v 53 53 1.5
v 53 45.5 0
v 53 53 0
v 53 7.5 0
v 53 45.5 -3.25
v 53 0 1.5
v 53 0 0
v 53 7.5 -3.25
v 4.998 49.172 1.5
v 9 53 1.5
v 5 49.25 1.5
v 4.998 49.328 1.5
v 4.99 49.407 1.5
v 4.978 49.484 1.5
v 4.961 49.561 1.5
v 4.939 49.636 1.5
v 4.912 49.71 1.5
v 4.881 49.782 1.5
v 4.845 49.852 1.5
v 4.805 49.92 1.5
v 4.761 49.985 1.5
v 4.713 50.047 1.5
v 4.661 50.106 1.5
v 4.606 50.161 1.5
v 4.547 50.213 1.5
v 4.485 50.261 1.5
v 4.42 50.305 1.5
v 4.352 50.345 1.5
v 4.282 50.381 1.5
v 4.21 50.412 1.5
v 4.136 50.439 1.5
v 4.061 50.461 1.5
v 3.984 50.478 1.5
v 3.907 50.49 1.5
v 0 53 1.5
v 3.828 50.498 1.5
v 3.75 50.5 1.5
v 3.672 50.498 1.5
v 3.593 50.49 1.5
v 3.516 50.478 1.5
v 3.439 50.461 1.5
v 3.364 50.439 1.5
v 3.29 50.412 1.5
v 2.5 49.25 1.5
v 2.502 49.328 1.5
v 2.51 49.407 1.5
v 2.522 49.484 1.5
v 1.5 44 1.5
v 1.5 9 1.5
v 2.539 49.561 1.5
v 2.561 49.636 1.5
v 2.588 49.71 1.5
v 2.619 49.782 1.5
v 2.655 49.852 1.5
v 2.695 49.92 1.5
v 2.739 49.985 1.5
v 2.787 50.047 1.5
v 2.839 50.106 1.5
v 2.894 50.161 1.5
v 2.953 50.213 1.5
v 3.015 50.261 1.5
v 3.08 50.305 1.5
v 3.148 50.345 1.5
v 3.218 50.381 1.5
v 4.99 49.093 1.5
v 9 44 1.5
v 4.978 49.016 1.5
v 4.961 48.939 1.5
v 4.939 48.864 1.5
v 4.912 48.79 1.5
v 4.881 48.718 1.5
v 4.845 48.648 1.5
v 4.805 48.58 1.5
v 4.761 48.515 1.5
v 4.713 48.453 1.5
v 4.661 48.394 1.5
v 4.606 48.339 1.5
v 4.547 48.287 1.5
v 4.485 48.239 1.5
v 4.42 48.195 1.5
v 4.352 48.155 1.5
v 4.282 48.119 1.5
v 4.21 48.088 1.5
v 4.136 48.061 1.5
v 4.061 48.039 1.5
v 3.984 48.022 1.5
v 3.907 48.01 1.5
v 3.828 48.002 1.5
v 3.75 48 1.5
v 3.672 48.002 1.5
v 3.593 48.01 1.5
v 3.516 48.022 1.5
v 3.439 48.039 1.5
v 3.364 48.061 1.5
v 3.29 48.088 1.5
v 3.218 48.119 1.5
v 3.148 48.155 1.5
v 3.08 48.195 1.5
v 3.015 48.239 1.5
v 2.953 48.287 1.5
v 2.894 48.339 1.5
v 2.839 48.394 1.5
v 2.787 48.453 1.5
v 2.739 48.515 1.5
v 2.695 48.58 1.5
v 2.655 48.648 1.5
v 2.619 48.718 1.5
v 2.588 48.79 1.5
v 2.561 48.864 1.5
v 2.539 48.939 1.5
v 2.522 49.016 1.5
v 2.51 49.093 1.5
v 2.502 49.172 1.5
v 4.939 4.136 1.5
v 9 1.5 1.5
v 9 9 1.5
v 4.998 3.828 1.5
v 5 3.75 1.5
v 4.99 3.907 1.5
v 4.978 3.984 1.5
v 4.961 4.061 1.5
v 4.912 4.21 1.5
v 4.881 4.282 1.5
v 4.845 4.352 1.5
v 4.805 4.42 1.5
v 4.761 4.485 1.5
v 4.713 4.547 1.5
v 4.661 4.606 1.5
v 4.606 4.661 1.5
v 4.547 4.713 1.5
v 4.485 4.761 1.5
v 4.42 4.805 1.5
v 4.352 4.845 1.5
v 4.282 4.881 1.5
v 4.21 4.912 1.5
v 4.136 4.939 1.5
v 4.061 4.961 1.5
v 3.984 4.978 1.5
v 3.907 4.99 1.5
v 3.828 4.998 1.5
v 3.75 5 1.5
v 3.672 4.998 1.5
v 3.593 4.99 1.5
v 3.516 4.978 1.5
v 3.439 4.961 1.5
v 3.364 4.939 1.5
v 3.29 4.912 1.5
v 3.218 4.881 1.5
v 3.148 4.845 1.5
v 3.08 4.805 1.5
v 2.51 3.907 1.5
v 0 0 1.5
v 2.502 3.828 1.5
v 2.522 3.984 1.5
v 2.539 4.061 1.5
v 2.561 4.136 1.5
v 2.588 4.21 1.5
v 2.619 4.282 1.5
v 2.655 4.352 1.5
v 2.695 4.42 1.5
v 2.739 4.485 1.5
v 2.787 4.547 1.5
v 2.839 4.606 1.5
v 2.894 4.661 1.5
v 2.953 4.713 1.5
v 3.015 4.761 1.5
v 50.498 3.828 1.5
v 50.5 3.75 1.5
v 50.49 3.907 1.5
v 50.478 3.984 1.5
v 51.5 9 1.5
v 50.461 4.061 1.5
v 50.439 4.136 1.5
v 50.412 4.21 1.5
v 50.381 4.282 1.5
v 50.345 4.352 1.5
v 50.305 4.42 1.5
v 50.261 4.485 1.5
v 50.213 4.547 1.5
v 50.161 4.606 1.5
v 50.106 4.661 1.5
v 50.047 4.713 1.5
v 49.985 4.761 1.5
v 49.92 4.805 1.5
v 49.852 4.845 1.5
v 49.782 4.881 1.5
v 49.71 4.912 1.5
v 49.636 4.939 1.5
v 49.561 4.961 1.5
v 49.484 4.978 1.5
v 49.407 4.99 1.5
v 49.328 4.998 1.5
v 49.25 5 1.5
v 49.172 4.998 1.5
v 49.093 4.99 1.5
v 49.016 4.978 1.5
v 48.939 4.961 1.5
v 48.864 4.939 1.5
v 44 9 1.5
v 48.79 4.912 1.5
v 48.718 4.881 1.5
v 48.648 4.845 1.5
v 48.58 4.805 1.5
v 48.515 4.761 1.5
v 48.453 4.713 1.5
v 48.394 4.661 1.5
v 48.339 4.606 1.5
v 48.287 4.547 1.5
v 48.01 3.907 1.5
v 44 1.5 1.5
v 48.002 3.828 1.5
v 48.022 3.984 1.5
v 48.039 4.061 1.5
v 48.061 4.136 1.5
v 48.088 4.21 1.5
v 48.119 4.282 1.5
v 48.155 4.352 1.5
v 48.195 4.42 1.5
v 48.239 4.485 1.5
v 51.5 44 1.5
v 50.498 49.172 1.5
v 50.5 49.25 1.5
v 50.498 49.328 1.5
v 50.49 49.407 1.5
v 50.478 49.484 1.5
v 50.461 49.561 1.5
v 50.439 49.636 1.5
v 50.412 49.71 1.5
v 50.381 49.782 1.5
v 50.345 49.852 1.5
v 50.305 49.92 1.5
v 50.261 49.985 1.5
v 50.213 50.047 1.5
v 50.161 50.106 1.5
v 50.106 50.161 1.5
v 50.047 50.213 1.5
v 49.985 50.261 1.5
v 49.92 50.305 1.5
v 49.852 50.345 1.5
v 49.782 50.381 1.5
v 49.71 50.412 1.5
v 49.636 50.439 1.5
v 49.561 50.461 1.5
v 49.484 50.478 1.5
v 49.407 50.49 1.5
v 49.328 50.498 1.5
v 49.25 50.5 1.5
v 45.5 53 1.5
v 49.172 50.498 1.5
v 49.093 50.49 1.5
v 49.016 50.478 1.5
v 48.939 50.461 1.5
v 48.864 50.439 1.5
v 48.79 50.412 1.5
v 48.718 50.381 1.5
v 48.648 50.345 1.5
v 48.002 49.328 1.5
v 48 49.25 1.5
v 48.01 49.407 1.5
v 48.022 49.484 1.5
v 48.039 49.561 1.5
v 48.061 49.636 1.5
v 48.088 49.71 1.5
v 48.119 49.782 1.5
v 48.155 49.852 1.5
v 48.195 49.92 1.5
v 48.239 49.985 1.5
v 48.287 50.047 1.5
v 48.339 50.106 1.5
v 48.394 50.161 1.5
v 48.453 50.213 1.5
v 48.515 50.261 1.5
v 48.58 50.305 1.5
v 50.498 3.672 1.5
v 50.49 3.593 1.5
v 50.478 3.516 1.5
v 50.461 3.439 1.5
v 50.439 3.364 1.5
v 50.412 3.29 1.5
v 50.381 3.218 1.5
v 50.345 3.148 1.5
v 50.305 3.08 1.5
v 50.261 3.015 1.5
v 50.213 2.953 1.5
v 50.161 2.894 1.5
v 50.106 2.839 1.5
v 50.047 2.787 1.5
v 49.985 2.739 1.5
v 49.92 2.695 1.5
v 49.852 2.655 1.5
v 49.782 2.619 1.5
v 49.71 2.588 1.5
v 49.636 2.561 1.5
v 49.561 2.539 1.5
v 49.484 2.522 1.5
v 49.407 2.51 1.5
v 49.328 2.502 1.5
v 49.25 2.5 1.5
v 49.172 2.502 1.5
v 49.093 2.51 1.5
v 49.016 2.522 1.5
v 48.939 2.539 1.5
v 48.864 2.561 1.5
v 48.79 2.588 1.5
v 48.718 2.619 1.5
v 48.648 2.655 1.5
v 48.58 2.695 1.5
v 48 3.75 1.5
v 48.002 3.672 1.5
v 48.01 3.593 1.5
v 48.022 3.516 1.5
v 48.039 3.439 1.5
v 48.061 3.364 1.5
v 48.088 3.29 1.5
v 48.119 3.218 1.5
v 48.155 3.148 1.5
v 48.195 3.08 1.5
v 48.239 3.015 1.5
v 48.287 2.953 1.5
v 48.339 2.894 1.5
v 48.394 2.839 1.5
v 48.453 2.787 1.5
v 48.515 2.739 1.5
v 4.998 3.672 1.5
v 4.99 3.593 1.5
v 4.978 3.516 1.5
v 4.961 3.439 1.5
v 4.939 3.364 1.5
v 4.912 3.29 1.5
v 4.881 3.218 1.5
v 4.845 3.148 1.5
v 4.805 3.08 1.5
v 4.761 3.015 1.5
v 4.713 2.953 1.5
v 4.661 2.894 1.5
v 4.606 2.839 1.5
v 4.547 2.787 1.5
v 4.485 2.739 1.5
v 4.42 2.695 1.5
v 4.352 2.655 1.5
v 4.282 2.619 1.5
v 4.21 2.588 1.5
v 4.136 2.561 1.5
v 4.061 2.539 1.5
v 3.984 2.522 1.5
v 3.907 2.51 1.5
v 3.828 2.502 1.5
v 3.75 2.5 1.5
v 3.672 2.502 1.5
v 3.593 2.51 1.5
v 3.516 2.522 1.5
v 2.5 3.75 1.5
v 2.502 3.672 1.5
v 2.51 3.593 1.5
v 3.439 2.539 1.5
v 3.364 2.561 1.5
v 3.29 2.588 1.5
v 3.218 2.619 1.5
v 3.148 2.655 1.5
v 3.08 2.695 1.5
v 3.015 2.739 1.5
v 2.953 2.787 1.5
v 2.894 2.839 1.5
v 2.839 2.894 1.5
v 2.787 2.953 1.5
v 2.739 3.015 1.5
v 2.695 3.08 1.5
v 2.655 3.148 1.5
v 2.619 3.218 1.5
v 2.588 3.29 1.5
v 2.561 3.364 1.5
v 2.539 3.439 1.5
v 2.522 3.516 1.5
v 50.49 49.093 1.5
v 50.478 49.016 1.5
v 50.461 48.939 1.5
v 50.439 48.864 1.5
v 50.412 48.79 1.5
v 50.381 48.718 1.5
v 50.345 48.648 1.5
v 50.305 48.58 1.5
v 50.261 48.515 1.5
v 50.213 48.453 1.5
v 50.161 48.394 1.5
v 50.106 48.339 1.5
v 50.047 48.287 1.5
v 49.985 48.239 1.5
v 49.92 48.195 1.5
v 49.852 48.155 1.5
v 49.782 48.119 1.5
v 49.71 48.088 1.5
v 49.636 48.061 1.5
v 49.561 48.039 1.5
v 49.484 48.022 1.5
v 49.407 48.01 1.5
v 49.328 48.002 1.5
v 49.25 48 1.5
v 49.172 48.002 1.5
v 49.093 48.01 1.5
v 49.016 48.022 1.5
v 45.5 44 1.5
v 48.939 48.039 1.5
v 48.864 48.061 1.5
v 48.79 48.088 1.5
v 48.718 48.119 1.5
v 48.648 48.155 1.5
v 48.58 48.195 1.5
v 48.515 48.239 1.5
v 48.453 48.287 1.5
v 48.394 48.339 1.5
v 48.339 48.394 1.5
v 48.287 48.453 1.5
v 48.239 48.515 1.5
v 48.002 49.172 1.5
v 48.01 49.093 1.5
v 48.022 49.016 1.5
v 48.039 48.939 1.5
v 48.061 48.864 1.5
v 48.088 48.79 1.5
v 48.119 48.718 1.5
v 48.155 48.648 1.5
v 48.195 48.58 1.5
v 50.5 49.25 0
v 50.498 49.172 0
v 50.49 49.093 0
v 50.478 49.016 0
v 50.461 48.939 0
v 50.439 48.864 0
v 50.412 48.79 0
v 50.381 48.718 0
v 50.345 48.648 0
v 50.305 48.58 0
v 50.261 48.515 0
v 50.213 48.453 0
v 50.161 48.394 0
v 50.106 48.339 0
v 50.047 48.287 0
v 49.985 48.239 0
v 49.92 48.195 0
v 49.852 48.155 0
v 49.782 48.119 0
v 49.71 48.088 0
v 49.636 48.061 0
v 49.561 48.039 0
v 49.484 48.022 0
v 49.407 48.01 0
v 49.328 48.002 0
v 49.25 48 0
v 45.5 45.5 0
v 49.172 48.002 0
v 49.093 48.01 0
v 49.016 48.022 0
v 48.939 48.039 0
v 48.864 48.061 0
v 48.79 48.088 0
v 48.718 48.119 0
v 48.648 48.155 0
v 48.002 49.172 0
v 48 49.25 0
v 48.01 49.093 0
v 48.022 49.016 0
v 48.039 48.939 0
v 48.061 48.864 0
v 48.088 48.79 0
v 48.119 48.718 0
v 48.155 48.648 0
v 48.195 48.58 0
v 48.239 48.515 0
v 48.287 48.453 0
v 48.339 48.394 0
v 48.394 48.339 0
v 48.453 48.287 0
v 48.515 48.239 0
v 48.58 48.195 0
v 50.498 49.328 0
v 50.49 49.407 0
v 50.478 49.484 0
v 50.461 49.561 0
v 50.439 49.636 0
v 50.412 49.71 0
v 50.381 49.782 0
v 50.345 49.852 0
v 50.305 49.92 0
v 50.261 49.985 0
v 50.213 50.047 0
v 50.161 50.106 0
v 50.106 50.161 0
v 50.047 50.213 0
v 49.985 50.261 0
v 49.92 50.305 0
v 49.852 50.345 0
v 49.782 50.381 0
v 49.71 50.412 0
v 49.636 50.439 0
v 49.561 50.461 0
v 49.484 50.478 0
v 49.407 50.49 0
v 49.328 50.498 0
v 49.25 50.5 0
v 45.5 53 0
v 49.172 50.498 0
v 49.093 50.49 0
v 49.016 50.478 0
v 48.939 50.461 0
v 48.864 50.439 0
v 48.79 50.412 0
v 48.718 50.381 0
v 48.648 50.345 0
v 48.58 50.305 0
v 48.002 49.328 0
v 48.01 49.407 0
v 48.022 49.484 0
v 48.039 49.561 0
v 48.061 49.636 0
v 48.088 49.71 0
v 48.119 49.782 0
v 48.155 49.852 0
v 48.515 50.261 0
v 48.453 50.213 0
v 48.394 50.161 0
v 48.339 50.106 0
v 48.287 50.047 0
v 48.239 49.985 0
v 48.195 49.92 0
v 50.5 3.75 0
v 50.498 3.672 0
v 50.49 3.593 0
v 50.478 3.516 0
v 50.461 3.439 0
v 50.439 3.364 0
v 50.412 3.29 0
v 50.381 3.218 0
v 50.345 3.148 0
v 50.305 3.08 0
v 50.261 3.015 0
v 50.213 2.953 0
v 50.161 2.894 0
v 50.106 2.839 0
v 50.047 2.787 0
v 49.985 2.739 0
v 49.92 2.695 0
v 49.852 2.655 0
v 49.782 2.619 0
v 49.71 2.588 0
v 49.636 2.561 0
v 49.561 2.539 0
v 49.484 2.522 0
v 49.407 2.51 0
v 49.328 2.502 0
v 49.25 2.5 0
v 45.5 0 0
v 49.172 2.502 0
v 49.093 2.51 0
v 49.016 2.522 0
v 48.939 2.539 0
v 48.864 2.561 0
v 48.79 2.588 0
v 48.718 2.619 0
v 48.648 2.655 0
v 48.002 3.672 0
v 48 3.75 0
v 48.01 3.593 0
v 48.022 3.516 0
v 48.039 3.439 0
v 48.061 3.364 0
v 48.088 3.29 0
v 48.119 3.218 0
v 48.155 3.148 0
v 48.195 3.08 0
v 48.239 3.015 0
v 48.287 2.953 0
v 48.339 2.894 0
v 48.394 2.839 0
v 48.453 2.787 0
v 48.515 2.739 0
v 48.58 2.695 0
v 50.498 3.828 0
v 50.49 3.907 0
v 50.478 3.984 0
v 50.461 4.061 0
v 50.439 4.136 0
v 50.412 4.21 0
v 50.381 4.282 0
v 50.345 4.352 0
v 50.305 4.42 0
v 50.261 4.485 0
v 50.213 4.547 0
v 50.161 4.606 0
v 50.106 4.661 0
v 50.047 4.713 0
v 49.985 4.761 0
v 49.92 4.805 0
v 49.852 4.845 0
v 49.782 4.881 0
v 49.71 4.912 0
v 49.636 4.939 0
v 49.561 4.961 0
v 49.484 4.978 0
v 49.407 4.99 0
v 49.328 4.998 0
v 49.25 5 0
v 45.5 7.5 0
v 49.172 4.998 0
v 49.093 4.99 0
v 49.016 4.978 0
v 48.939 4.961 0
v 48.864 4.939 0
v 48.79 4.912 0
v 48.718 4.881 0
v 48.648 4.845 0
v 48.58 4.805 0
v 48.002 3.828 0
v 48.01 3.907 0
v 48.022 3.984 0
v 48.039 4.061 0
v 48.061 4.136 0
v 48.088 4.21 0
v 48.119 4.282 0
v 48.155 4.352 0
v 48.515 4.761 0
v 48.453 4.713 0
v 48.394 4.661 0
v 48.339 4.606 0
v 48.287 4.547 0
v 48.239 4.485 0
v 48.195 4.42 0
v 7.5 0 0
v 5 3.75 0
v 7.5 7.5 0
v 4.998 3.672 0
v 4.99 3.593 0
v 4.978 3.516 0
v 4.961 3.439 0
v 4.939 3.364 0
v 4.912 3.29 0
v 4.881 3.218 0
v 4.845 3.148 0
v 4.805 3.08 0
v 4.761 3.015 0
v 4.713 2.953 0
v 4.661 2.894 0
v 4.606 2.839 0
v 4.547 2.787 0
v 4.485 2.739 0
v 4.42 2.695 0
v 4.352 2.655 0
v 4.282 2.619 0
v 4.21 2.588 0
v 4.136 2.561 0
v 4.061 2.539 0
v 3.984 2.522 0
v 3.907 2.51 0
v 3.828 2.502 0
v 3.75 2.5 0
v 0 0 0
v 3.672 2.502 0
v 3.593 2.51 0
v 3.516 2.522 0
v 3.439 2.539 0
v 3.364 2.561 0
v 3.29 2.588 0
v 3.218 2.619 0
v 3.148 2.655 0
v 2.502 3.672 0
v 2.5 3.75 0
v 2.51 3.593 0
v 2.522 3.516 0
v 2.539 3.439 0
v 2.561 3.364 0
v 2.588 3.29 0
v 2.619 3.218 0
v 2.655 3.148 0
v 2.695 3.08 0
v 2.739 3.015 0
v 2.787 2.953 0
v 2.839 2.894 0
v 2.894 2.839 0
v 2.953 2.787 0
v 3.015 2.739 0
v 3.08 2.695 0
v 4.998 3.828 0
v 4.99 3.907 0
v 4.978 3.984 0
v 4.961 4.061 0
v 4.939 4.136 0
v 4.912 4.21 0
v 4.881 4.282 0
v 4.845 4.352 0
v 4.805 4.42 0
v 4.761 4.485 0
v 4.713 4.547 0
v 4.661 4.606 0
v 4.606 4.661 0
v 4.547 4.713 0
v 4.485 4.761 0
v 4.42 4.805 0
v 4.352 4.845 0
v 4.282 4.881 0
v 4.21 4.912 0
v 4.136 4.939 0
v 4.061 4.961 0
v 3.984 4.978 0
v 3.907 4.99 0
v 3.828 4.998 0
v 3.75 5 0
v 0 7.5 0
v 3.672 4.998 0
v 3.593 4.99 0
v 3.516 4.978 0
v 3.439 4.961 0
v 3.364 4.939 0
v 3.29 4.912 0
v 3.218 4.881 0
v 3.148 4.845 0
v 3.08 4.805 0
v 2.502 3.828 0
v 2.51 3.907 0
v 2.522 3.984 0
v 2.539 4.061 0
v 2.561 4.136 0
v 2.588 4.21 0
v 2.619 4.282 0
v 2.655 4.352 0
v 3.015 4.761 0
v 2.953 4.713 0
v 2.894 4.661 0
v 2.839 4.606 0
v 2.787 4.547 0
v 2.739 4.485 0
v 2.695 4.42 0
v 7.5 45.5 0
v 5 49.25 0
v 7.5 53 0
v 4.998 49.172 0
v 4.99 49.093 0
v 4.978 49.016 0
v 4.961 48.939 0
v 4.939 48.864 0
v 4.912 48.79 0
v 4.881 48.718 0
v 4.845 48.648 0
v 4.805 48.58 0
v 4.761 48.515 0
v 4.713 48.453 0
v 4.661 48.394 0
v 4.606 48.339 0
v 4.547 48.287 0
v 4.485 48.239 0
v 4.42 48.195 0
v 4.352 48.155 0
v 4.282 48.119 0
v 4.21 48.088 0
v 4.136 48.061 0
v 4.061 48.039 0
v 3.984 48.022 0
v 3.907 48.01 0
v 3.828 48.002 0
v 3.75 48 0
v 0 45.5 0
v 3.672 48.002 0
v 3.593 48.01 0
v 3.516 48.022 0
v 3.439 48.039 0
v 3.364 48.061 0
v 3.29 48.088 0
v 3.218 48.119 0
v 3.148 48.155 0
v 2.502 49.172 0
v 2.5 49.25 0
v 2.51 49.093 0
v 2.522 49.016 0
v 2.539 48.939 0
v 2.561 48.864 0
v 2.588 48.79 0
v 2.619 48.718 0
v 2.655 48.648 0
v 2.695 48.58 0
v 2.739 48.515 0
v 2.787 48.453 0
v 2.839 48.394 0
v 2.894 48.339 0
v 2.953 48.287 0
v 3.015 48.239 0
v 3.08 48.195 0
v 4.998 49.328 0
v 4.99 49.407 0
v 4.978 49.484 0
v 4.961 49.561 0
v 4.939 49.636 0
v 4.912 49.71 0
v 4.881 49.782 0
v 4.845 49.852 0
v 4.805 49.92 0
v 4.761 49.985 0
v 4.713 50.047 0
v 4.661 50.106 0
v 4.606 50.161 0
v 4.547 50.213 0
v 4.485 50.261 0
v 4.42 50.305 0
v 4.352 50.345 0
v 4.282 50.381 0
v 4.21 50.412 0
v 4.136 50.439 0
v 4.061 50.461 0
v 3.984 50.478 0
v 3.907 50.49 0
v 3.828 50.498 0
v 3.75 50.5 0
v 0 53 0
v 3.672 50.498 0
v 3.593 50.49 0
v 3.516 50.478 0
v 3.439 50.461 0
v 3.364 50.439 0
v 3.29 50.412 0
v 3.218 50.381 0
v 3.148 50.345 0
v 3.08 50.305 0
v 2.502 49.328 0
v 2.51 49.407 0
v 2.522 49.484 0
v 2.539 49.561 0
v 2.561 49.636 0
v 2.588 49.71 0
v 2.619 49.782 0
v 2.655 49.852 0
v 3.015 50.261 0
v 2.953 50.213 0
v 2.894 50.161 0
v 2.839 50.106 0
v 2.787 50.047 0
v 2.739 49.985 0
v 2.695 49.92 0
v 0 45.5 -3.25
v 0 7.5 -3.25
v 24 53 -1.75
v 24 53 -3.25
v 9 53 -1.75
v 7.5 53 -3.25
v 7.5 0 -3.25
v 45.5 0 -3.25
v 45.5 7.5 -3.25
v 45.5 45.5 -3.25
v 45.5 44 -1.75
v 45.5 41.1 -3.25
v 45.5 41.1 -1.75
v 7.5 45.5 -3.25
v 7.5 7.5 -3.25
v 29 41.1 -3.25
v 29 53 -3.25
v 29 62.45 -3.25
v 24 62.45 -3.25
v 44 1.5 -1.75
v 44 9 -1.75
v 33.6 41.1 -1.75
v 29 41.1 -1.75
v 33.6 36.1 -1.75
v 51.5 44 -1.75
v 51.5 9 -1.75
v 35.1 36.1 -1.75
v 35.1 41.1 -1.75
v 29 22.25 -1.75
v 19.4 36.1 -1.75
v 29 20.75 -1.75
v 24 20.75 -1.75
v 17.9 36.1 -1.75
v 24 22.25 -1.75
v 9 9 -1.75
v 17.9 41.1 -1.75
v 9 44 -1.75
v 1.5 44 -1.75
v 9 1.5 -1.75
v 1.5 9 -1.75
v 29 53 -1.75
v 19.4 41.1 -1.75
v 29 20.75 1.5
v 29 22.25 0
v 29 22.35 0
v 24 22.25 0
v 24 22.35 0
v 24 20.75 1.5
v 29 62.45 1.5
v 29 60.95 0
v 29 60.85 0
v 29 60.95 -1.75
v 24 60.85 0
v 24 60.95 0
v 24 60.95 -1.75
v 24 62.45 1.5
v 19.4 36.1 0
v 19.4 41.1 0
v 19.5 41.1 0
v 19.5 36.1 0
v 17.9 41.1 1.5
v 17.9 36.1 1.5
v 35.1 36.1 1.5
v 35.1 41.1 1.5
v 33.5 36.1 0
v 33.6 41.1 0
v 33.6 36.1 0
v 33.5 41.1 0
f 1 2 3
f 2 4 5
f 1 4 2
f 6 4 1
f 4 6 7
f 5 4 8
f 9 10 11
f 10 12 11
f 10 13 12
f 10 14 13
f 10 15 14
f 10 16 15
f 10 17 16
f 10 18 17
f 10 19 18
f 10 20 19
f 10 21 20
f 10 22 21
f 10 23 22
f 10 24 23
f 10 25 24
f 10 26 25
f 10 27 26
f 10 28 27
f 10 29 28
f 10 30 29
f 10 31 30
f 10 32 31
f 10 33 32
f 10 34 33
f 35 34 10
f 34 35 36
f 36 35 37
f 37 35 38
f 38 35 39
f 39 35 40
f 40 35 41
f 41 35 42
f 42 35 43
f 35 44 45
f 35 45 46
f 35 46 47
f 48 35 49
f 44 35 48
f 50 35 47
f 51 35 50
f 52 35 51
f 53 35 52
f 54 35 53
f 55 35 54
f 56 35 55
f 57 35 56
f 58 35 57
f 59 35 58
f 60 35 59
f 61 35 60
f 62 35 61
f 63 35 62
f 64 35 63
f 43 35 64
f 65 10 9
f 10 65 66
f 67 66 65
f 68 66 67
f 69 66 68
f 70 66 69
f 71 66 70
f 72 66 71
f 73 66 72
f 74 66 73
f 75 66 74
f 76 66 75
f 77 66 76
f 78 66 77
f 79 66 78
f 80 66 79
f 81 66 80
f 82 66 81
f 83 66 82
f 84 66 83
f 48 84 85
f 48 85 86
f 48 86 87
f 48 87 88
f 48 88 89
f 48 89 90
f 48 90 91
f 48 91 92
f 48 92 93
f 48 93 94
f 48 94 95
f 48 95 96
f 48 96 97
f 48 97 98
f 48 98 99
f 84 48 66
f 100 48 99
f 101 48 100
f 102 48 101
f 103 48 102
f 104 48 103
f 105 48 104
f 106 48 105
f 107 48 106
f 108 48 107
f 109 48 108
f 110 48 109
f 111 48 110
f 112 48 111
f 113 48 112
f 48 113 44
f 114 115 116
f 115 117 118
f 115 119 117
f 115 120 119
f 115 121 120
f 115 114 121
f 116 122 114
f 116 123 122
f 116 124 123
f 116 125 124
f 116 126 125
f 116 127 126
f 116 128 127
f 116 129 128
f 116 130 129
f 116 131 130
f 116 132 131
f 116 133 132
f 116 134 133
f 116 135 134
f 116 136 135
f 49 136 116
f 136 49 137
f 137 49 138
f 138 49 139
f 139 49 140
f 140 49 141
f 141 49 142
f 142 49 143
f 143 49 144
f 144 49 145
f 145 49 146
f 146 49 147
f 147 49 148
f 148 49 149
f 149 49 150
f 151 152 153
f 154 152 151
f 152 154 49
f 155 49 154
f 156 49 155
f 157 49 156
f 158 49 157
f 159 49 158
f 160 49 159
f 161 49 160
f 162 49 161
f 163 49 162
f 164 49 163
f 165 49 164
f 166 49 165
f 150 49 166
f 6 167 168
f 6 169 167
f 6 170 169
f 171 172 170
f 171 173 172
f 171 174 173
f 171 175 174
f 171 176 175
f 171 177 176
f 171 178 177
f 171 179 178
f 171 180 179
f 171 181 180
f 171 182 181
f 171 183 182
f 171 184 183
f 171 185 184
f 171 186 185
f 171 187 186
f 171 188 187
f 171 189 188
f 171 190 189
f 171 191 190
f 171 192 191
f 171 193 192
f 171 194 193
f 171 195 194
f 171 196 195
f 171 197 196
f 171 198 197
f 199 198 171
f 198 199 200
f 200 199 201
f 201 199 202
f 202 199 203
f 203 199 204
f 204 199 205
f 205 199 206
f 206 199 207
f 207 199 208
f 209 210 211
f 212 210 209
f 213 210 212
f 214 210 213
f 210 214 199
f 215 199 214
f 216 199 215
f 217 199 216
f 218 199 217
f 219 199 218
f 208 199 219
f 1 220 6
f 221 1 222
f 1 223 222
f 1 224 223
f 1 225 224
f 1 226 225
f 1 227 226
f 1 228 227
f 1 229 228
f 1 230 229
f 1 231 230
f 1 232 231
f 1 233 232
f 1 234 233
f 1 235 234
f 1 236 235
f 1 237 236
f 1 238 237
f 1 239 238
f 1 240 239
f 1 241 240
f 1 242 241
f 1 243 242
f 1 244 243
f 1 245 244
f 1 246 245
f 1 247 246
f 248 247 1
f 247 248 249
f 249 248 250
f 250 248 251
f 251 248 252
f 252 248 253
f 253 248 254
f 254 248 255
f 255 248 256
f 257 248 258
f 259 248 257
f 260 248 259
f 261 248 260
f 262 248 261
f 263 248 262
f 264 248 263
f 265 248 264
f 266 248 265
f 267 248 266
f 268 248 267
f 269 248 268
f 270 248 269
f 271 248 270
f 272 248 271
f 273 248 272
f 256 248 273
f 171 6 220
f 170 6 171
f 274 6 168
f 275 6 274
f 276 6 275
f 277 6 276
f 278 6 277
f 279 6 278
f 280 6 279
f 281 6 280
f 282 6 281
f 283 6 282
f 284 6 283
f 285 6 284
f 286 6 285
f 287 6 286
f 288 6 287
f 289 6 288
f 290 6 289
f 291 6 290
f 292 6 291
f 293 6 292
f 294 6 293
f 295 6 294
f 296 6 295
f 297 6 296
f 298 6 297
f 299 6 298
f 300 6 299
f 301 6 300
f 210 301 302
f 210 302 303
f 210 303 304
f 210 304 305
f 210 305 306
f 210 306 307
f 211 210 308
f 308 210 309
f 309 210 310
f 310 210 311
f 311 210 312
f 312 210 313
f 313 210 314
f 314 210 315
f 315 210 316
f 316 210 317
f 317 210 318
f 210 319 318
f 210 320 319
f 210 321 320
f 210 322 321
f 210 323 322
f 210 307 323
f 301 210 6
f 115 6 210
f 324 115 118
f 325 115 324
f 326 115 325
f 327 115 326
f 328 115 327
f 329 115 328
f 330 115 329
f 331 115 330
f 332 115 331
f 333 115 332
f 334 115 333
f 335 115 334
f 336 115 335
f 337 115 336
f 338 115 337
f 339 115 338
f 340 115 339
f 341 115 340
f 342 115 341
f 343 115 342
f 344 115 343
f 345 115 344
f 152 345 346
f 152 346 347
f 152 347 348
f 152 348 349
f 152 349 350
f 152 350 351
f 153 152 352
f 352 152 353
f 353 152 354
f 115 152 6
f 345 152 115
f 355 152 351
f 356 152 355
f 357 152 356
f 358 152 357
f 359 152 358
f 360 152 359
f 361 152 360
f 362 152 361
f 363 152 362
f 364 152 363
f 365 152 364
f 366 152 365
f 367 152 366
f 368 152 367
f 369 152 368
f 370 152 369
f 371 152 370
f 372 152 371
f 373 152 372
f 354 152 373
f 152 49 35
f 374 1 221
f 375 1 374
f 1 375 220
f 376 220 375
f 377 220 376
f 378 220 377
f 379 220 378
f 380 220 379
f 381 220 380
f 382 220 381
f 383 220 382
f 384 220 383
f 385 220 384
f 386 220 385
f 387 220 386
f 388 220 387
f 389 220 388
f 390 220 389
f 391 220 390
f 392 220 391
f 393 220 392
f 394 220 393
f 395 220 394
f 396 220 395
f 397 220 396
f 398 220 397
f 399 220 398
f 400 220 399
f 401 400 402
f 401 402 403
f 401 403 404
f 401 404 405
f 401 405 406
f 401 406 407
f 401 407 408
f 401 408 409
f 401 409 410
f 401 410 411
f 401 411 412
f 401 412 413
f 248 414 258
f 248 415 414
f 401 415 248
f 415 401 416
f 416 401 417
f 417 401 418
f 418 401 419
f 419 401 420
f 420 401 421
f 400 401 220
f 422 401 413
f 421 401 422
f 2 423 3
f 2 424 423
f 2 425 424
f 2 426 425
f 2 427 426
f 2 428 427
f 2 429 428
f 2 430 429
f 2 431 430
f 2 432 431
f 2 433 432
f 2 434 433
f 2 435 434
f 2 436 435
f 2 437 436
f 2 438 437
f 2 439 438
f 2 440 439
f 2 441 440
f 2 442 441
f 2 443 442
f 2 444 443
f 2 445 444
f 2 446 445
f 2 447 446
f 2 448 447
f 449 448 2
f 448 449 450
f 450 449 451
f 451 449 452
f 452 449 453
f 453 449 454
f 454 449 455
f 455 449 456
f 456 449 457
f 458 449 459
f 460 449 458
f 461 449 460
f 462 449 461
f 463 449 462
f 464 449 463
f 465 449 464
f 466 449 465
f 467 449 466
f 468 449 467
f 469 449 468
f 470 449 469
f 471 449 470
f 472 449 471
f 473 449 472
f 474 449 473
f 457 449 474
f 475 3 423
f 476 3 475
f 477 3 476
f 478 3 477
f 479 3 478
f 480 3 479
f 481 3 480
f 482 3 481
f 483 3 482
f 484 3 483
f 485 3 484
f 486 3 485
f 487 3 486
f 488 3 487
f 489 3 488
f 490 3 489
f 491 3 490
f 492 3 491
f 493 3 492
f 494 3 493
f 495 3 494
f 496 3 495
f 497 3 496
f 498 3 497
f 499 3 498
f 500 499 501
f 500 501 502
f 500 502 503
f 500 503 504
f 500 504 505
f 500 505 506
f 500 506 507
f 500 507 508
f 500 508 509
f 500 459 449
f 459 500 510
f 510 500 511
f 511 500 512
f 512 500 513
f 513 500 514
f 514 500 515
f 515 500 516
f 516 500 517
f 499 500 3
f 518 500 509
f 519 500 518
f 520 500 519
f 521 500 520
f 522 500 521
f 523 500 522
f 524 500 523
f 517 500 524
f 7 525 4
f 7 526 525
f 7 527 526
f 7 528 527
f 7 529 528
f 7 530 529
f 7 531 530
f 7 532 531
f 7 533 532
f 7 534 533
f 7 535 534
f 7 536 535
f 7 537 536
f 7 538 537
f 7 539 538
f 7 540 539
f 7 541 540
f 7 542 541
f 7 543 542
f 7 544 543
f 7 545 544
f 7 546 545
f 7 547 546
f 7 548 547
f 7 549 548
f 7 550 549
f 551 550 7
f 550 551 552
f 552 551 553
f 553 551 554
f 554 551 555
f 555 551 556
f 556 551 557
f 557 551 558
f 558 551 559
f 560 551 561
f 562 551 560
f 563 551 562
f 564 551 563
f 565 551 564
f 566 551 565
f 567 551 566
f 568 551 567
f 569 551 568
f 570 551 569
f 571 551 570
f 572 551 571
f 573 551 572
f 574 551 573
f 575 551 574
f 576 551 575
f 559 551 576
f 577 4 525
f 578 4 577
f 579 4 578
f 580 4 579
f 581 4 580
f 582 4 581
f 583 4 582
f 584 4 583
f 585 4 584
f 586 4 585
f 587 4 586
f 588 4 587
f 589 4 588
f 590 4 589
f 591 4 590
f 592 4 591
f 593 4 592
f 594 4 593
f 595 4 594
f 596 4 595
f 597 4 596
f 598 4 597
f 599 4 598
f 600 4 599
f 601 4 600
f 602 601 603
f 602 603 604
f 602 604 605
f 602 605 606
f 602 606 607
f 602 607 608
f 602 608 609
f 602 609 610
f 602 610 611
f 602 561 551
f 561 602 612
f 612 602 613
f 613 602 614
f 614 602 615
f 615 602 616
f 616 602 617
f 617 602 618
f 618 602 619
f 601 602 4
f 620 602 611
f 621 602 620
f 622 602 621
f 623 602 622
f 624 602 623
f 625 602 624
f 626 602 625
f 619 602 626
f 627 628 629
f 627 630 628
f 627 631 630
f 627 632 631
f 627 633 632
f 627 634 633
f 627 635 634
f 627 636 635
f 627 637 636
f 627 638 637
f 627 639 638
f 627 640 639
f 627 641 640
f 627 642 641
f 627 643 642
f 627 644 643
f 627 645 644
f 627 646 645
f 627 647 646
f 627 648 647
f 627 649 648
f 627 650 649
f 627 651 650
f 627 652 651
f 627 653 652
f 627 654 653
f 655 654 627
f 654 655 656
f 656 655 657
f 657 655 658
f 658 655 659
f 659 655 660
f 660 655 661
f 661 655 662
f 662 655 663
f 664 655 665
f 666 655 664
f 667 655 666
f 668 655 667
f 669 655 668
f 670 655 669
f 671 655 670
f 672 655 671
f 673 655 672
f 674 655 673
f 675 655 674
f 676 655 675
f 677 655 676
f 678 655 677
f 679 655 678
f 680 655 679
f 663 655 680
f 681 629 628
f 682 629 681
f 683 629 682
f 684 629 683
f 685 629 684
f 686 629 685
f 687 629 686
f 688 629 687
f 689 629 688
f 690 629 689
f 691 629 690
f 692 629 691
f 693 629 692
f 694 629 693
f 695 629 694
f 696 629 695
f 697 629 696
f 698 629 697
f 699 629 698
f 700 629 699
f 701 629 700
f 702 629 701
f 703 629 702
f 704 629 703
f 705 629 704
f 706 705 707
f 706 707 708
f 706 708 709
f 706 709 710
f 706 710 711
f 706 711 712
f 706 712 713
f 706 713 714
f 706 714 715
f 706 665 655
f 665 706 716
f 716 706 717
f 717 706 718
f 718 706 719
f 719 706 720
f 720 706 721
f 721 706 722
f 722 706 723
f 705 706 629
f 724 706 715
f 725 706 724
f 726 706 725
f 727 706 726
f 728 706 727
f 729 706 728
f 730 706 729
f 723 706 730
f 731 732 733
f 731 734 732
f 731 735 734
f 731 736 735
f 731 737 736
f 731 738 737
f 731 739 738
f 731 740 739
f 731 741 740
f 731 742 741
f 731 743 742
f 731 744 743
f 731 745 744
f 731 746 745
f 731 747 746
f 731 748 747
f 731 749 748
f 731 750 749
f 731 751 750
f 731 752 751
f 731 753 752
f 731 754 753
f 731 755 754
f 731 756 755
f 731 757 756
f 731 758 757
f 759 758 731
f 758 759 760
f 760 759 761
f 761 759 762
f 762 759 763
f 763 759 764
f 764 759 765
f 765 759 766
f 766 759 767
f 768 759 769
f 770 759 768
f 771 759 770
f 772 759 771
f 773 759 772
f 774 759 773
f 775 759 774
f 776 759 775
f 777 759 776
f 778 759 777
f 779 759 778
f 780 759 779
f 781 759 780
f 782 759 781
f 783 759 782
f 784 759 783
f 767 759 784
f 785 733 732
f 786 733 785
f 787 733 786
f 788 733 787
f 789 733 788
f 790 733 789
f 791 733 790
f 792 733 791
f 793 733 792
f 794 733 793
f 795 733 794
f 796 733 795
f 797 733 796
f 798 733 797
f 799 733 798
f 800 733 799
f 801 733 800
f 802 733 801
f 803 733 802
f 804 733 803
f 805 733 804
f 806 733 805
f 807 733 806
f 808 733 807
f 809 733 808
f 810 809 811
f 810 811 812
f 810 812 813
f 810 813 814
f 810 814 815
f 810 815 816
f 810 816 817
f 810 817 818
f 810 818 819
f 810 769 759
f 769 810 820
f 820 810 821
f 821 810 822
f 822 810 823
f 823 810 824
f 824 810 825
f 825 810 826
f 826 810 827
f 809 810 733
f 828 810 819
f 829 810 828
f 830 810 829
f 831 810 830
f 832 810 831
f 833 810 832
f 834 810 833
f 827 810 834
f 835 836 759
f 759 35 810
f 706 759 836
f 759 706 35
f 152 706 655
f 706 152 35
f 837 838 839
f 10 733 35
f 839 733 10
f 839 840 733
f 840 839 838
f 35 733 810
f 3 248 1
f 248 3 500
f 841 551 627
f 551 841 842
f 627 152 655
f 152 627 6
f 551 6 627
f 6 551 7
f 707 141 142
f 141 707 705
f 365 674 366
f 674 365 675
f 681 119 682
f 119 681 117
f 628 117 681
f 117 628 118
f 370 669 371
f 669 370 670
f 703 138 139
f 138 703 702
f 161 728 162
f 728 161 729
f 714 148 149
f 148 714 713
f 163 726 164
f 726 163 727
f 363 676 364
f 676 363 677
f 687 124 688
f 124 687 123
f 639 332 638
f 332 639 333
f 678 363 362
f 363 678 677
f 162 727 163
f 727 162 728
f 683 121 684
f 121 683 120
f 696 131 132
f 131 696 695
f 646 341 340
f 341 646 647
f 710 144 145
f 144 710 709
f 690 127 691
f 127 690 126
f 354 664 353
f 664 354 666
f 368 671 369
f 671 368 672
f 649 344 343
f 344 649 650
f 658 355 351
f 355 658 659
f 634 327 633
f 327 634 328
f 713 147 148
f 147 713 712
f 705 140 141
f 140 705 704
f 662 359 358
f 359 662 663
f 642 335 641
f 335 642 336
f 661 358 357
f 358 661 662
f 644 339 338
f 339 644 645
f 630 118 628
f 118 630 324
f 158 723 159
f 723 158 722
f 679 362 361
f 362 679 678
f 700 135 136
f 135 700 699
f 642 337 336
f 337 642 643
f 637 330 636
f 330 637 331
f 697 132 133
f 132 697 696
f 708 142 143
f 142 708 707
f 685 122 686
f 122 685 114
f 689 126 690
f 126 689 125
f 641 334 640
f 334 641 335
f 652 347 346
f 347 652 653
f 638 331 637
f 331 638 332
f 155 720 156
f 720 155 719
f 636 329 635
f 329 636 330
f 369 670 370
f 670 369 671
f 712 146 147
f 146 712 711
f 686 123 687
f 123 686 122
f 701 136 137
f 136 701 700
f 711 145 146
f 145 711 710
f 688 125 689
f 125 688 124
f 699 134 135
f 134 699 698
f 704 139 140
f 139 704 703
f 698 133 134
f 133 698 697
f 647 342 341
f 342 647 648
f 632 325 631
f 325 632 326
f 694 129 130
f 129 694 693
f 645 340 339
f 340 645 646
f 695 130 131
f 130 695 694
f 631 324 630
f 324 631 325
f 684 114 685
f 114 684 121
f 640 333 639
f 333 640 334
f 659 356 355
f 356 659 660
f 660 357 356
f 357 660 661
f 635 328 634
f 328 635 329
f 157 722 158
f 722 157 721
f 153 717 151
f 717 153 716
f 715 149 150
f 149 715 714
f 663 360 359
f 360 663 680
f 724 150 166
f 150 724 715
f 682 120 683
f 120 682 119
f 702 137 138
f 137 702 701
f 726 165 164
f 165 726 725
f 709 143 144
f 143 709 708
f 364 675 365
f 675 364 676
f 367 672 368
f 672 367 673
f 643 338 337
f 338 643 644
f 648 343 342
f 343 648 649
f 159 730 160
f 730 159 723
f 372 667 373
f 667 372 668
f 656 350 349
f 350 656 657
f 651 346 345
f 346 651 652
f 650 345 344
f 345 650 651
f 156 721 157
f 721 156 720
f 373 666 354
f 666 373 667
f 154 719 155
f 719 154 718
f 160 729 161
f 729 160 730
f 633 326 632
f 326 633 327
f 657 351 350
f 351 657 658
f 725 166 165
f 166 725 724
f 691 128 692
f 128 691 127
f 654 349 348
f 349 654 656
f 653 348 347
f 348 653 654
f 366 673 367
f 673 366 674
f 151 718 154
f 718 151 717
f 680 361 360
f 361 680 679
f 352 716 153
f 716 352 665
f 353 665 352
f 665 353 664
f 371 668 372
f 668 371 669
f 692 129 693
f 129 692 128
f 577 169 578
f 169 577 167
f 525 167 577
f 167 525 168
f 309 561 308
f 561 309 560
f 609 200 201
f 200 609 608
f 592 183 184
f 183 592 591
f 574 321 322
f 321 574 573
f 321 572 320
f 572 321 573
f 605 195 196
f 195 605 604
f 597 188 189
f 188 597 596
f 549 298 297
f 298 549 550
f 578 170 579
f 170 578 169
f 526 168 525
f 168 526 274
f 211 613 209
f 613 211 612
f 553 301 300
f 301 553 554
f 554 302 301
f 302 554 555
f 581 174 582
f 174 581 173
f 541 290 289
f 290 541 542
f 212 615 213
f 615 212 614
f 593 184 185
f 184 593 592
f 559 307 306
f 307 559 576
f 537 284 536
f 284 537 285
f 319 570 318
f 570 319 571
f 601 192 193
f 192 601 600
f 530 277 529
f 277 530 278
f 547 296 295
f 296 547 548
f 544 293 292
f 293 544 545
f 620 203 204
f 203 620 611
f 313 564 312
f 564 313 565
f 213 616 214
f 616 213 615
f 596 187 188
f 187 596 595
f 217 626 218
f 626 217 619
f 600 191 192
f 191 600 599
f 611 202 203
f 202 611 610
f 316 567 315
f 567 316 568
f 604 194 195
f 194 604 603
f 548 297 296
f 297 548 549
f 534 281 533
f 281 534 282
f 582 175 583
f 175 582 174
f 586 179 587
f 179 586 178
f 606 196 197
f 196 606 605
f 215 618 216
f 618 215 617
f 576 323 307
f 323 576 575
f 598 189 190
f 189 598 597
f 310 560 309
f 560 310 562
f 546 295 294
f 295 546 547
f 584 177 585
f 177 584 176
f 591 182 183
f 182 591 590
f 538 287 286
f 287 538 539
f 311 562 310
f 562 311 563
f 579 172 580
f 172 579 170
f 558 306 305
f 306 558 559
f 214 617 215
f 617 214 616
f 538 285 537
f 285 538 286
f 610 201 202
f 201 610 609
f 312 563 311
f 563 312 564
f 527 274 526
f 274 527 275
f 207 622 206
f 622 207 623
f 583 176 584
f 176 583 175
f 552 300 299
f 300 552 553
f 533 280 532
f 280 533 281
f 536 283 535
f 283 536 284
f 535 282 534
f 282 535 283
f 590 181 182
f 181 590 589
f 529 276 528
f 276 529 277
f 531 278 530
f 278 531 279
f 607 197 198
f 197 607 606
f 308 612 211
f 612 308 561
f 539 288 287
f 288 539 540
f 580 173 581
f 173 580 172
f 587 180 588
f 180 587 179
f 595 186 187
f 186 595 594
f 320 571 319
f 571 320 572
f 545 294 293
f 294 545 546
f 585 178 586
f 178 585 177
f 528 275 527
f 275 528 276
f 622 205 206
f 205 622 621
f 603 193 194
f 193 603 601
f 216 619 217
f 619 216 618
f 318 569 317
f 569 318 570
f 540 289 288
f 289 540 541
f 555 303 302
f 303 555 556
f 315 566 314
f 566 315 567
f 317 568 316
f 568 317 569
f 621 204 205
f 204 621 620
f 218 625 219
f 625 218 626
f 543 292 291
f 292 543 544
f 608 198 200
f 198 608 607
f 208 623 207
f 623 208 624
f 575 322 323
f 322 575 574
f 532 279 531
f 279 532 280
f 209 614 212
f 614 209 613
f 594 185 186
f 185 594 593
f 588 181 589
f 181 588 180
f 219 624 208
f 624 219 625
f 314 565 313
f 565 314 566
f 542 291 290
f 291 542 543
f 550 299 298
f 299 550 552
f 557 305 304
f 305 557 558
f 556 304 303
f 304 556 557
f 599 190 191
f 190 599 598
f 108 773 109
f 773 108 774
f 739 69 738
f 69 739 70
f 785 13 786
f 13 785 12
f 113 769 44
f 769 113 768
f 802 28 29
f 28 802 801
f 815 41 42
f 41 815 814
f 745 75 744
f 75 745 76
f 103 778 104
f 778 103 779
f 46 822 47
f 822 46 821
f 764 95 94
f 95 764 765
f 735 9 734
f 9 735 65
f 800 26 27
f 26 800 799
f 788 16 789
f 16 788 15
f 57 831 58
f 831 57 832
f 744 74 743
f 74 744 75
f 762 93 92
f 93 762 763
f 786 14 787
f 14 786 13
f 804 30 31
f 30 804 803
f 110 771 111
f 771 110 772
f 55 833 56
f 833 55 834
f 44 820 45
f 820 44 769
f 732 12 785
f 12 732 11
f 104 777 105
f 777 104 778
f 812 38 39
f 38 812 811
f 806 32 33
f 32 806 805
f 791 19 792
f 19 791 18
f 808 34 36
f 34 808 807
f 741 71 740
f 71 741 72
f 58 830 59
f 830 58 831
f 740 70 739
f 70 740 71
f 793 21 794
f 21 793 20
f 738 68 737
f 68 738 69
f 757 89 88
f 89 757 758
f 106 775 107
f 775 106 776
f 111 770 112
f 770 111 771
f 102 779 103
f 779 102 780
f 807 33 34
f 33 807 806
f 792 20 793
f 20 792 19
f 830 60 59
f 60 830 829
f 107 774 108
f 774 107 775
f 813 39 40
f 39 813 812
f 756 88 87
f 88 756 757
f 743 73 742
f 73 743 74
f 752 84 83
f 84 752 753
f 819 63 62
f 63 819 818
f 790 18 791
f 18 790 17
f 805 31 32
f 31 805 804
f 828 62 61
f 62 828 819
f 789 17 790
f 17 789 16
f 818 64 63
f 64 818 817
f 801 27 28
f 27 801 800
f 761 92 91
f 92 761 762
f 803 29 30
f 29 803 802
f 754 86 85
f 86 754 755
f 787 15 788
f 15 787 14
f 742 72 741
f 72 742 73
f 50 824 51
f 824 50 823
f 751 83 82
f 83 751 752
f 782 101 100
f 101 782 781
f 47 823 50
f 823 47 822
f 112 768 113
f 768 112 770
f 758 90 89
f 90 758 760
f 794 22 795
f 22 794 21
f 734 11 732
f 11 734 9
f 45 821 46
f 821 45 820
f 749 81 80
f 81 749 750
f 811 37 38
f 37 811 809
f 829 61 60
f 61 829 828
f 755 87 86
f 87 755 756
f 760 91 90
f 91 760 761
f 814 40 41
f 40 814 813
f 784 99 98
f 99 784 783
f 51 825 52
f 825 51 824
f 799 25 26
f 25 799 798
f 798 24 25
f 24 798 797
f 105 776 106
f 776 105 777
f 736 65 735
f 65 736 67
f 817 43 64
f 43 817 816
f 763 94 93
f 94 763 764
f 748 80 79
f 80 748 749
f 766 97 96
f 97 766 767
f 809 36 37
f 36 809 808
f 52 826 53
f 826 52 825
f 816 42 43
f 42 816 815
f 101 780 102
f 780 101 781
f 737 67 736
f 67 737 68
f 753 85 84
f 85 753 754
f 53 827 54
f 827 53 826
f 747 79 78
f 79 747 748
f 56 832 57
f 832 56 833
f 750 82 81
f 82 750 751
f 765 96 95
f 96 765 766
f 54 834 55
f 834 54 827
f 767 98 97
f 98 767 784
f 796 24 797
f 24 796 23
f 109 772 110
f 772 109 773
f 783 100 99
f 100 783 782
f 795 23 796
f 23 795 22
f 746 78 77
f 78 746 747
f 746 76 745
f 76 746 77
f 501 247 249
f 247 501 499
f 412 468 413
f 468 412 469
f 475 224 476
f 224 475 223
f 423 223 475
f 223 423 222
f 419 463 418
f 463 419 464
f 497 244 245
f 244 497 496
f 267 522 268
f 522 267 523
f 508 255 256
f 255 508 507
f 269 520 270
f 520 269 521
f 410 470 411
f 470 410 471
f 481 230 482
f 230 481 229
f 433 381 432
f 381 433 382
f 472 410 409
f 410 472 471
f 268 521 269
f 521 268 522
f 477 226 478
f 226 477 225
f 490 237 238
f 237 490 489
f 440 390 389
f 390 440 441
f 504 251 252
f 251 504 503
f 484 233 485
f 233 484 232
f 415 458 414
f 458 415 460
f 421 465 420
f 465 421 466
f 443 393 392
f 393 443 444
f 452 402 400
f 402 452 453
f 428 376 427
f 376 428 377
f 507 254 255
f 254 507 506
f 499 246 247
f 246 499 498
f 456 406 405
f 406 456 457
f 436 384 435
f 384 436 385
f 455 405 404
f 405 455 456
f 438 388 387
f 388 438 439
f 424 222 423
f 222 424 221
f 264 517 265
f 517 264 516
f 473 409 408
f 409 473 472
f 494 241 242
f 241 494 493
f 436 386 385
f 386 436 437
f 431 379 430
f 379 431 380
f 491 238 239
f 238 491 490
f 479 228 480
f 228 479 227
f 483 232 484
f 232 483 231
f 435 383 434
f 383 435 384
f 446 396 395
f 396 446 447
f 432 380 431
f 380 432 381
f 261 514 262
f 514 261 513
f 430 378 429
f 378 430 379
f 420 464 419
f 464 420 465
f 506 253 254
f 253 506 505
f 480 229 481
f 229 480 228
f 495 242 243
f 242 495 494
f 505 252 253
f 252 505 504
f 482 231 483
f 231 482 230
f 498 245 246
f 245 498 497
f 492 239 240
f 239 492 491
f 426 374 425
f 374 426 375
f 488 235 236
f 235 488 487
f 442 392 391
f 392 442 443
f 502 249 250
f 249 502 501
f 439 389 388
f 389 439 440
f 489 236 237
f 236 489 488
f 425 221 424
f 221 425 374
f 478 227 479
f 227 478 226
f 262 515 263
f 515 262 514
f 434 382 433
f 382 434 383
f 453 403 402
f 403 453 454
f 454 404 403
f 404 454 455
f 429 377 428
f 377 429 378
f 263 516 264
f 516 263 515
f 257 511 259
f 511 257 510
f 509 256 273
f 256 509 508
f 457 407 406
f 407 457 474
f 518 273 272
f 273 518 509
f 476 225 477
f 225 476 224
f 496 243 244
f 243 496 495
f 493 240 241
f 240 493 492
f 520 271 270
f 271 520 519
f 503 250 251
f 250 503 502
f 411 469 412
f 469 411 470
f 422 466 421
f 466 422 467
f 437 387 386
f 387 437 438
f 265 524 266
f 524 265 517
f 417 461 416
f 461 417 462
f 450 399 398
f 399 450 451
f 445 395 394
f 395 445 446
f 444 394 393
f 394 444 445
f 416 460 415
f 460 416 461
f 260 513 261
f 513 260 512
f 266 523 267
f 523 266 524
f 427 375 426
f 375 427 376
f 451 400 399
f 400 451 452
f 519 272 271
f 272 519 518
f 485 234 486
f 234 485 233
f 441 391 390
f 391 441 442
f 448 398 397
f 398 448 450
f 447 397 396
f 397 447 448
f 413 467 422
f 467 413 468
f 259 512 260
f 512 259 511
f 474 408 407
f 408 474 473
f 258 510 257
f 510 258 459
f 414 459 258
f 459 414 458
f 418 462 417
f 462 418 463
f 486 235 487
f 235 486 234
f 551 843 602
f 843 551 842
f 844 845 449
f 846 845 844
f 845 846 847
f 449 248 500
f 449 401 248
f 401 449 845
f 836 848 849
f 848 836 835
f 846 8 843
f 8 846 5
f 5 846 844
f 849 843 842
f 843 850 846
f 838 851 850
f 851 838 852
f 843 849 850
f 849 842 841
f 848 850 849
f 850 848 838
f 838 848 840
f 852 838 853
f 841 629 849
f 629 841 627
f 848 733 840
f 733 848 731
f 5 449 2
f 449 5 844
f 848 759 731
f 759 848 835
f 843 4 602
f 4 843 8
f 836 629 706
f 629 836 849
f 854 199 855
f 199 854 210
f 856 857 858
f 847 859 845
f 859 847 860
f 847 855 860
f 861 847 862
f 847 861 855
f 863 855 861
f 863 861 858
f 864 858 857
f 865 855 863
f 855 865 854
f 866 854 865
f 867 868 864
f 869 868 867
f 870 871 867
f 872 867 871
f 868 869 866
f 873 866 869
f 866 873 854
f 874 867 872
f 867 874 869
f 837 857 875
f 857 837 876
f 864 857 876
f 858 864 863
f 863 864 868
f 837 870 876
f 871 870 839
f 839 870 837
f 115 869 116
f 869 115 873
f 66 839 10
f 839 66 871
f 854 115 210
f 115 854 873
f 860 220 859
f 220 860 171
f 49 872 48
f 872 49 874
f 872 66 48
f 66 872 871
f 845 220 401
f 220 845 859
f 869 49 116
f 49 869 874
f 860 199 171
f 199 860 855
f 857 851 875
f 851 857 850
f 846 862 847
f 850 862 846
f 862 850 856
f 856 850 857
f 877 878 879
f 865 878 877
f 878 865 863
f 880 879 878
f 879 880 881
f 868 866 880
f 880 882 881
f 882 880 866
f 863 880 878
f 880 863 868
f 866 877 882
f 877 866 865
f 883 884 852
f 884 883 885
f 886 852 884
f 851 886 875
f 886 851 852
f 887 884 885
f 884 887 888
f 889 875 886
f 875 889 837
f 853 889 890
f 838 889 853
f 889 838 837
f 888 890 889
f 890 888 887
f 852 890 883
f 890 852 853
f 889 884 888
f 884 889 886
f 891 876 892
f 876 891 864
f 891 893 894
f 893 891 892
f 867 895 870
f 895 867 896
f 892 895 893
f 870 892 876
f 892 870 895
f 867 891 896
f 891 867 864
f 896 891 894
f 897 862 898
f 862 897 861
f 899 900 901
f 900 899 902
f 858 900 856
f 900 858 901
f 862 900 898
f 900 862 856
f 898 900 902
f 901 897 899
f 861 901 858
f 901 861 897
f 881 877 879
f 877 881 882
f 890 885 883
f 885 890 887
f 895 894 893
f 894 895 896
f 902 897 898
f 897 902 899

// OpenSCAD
min_thickness=1.5;
depth=min_thickness;
m3_dia=2.5;

module hole(x, y) {
     translate([x, y, 0]) cylinder(h=depth, d=m3_dia, center=false, $fn=100);
}

width=53;
length=width;
edge_to_hole=3.75;
inner_offset=edge_to_hole*2;
inner_width=width-inner_offset*2;
inner_depth=4.75;

module core() {
     // Outer platform
     difference () {
          cube([width, length, depth]);
          hole(edge_to_hole, edge_to_hole);
          hole(width-edge_to_hole, edge_to_hole);
          hole(edge_to_hole, width-edge_to_hole);
          hole(width-edge_to_hole, width-edge_to_hole);
     }
     // Solid inner platform
     translate([inner_offset, 0, depth-inner_depth])
          cube([inner_width, width, inner_depth]);
     translate([0, inner_offset, depth-inner_depth])
          cube([width, inner_width, inner_depth]);
}

cutout_offset=inner_offset+min_thickness;
cutout_width1=inner_width-min_thickness*2;
cutout_width2=width-min_thickness*2;
cutout_depth=inner_depth-min_thickness;
cutout_depth_offset=depth-cutout_depth;

spacing=0.1;

board_width=14;
board_height=38.5;
board_depth=1.65+spacing;
board_width_offset=19.5;
board_height_offset=22.35;
board_hole_offset=38.6;
clip_length=5;

difference () {
     core();
     // Inner cutout
     translate([cutout_offset, min_thickness, cutout_depth_offset])
          cube([cutout_width1, cutout_width2, cutout_depth]);
     translate([min_thickness, cutout_offset, cutout_depth_offset])
          cube([cutout_width2, cutout_width1, cutout_depth]);
     // Header cutout
     translate([width/2+clip_length/2, board_hole_offset+clip_length/2,
                depth-inner_depth]) cube([width/2-clip_length/2-edge_to_hole*2,
                                          width-board_hole_offset+clip_length/2,
                                          inner_depth]);
     // Board cutout
     translate([board_width_offset, board_height_offset, cutout_depth_offset])
          cube([board_width, board_height, inner_depth]);
     // Extra wall cutout
     translate([cutout_offset, width-min_thickness, cutout_depth_offset])
          cube([width/2-board_width/2-cutout_offset, min_thickness,
                cutout_depth]);
}

clip_lip=0.1;
clip_lip_height=1.5;

module clip_top() {
     clip_top_points = [
          // Base
          [0, 0, 0],
          [clip_length, 0, 0],
          [0, min_thickness+clip_lip, 0],
          [clip_length, min_thickness+clip_lip, 0],
          // Back
          [0, 0, clip_lip_height],
          [clip_length, 0, clip_lip_height],
          ];

     clip_top_faces = [
          // Base
          [0, 1, 3, 2],
          // Back
          [0, 4, 5, 1],
          // Front
          [3, 5, 4, 2],
          // Left
          [1, 5, 3],
          // Right
          [0, 2, 4],
          ];

     polyhedron(clip_top_points, clip_top_faces);
}

// Clip bases
translate([width/2-clip_length/2, board_height_offset-min_thickness-spacing,
           cutout_depth_offset]) cube([clip_length, min_thickness, board_depth]);
translate([width/2-clip_length/2, board_height_offset+board_height+spacing,
           cutout_depth_offset]) cube([clip_length, min_thickness, board_depth]);
translate([board_width_offset-min_thickness-spacing, board_hole_offset-clip_length/2,
           cutout_depth_offset]) cube([min_thickness, clip_length, board_depth]);
translate([board_width_offset+board_width+spacing, board_hole_offset-clip_length/2,
           cutout_depth_offset]) cube([min_thickness, clip_length, board_depth]);

// Clip tops
translate([width/2-clip_length/2, board_height_offset-min_thickness-spacing,
           cutout_depth_offset+board_depth]) clip_top();
translate([width/2-clip_length/2+clip_length,
           board_height_offset+board_height+min_thickness+spacing,
           cutout_depth_offset+board_depth]) rotate([0, 0, 180]) clip_top();
translate([board_width_offset-min_thickness-spacing, board_hole_offset-clip_length/2+clip_length,
           cutout_depth_offset+board_depth]) rotate([0, 0, 270]) clip_top();
translate([board_width_offset+board_width+min_thickness+spacing, board_hole_offset-clip_length/2,
           cutout_depth_offset+board_depth]) rotate([0, 0, 90]) clip_top();

// Clip platform extension
translate([width/2-clip_length/2, width, depth-inner_depth])
cube([clip_length, board_height_offset+board_height-width+min_thickness+spacing, min_thickness]);
